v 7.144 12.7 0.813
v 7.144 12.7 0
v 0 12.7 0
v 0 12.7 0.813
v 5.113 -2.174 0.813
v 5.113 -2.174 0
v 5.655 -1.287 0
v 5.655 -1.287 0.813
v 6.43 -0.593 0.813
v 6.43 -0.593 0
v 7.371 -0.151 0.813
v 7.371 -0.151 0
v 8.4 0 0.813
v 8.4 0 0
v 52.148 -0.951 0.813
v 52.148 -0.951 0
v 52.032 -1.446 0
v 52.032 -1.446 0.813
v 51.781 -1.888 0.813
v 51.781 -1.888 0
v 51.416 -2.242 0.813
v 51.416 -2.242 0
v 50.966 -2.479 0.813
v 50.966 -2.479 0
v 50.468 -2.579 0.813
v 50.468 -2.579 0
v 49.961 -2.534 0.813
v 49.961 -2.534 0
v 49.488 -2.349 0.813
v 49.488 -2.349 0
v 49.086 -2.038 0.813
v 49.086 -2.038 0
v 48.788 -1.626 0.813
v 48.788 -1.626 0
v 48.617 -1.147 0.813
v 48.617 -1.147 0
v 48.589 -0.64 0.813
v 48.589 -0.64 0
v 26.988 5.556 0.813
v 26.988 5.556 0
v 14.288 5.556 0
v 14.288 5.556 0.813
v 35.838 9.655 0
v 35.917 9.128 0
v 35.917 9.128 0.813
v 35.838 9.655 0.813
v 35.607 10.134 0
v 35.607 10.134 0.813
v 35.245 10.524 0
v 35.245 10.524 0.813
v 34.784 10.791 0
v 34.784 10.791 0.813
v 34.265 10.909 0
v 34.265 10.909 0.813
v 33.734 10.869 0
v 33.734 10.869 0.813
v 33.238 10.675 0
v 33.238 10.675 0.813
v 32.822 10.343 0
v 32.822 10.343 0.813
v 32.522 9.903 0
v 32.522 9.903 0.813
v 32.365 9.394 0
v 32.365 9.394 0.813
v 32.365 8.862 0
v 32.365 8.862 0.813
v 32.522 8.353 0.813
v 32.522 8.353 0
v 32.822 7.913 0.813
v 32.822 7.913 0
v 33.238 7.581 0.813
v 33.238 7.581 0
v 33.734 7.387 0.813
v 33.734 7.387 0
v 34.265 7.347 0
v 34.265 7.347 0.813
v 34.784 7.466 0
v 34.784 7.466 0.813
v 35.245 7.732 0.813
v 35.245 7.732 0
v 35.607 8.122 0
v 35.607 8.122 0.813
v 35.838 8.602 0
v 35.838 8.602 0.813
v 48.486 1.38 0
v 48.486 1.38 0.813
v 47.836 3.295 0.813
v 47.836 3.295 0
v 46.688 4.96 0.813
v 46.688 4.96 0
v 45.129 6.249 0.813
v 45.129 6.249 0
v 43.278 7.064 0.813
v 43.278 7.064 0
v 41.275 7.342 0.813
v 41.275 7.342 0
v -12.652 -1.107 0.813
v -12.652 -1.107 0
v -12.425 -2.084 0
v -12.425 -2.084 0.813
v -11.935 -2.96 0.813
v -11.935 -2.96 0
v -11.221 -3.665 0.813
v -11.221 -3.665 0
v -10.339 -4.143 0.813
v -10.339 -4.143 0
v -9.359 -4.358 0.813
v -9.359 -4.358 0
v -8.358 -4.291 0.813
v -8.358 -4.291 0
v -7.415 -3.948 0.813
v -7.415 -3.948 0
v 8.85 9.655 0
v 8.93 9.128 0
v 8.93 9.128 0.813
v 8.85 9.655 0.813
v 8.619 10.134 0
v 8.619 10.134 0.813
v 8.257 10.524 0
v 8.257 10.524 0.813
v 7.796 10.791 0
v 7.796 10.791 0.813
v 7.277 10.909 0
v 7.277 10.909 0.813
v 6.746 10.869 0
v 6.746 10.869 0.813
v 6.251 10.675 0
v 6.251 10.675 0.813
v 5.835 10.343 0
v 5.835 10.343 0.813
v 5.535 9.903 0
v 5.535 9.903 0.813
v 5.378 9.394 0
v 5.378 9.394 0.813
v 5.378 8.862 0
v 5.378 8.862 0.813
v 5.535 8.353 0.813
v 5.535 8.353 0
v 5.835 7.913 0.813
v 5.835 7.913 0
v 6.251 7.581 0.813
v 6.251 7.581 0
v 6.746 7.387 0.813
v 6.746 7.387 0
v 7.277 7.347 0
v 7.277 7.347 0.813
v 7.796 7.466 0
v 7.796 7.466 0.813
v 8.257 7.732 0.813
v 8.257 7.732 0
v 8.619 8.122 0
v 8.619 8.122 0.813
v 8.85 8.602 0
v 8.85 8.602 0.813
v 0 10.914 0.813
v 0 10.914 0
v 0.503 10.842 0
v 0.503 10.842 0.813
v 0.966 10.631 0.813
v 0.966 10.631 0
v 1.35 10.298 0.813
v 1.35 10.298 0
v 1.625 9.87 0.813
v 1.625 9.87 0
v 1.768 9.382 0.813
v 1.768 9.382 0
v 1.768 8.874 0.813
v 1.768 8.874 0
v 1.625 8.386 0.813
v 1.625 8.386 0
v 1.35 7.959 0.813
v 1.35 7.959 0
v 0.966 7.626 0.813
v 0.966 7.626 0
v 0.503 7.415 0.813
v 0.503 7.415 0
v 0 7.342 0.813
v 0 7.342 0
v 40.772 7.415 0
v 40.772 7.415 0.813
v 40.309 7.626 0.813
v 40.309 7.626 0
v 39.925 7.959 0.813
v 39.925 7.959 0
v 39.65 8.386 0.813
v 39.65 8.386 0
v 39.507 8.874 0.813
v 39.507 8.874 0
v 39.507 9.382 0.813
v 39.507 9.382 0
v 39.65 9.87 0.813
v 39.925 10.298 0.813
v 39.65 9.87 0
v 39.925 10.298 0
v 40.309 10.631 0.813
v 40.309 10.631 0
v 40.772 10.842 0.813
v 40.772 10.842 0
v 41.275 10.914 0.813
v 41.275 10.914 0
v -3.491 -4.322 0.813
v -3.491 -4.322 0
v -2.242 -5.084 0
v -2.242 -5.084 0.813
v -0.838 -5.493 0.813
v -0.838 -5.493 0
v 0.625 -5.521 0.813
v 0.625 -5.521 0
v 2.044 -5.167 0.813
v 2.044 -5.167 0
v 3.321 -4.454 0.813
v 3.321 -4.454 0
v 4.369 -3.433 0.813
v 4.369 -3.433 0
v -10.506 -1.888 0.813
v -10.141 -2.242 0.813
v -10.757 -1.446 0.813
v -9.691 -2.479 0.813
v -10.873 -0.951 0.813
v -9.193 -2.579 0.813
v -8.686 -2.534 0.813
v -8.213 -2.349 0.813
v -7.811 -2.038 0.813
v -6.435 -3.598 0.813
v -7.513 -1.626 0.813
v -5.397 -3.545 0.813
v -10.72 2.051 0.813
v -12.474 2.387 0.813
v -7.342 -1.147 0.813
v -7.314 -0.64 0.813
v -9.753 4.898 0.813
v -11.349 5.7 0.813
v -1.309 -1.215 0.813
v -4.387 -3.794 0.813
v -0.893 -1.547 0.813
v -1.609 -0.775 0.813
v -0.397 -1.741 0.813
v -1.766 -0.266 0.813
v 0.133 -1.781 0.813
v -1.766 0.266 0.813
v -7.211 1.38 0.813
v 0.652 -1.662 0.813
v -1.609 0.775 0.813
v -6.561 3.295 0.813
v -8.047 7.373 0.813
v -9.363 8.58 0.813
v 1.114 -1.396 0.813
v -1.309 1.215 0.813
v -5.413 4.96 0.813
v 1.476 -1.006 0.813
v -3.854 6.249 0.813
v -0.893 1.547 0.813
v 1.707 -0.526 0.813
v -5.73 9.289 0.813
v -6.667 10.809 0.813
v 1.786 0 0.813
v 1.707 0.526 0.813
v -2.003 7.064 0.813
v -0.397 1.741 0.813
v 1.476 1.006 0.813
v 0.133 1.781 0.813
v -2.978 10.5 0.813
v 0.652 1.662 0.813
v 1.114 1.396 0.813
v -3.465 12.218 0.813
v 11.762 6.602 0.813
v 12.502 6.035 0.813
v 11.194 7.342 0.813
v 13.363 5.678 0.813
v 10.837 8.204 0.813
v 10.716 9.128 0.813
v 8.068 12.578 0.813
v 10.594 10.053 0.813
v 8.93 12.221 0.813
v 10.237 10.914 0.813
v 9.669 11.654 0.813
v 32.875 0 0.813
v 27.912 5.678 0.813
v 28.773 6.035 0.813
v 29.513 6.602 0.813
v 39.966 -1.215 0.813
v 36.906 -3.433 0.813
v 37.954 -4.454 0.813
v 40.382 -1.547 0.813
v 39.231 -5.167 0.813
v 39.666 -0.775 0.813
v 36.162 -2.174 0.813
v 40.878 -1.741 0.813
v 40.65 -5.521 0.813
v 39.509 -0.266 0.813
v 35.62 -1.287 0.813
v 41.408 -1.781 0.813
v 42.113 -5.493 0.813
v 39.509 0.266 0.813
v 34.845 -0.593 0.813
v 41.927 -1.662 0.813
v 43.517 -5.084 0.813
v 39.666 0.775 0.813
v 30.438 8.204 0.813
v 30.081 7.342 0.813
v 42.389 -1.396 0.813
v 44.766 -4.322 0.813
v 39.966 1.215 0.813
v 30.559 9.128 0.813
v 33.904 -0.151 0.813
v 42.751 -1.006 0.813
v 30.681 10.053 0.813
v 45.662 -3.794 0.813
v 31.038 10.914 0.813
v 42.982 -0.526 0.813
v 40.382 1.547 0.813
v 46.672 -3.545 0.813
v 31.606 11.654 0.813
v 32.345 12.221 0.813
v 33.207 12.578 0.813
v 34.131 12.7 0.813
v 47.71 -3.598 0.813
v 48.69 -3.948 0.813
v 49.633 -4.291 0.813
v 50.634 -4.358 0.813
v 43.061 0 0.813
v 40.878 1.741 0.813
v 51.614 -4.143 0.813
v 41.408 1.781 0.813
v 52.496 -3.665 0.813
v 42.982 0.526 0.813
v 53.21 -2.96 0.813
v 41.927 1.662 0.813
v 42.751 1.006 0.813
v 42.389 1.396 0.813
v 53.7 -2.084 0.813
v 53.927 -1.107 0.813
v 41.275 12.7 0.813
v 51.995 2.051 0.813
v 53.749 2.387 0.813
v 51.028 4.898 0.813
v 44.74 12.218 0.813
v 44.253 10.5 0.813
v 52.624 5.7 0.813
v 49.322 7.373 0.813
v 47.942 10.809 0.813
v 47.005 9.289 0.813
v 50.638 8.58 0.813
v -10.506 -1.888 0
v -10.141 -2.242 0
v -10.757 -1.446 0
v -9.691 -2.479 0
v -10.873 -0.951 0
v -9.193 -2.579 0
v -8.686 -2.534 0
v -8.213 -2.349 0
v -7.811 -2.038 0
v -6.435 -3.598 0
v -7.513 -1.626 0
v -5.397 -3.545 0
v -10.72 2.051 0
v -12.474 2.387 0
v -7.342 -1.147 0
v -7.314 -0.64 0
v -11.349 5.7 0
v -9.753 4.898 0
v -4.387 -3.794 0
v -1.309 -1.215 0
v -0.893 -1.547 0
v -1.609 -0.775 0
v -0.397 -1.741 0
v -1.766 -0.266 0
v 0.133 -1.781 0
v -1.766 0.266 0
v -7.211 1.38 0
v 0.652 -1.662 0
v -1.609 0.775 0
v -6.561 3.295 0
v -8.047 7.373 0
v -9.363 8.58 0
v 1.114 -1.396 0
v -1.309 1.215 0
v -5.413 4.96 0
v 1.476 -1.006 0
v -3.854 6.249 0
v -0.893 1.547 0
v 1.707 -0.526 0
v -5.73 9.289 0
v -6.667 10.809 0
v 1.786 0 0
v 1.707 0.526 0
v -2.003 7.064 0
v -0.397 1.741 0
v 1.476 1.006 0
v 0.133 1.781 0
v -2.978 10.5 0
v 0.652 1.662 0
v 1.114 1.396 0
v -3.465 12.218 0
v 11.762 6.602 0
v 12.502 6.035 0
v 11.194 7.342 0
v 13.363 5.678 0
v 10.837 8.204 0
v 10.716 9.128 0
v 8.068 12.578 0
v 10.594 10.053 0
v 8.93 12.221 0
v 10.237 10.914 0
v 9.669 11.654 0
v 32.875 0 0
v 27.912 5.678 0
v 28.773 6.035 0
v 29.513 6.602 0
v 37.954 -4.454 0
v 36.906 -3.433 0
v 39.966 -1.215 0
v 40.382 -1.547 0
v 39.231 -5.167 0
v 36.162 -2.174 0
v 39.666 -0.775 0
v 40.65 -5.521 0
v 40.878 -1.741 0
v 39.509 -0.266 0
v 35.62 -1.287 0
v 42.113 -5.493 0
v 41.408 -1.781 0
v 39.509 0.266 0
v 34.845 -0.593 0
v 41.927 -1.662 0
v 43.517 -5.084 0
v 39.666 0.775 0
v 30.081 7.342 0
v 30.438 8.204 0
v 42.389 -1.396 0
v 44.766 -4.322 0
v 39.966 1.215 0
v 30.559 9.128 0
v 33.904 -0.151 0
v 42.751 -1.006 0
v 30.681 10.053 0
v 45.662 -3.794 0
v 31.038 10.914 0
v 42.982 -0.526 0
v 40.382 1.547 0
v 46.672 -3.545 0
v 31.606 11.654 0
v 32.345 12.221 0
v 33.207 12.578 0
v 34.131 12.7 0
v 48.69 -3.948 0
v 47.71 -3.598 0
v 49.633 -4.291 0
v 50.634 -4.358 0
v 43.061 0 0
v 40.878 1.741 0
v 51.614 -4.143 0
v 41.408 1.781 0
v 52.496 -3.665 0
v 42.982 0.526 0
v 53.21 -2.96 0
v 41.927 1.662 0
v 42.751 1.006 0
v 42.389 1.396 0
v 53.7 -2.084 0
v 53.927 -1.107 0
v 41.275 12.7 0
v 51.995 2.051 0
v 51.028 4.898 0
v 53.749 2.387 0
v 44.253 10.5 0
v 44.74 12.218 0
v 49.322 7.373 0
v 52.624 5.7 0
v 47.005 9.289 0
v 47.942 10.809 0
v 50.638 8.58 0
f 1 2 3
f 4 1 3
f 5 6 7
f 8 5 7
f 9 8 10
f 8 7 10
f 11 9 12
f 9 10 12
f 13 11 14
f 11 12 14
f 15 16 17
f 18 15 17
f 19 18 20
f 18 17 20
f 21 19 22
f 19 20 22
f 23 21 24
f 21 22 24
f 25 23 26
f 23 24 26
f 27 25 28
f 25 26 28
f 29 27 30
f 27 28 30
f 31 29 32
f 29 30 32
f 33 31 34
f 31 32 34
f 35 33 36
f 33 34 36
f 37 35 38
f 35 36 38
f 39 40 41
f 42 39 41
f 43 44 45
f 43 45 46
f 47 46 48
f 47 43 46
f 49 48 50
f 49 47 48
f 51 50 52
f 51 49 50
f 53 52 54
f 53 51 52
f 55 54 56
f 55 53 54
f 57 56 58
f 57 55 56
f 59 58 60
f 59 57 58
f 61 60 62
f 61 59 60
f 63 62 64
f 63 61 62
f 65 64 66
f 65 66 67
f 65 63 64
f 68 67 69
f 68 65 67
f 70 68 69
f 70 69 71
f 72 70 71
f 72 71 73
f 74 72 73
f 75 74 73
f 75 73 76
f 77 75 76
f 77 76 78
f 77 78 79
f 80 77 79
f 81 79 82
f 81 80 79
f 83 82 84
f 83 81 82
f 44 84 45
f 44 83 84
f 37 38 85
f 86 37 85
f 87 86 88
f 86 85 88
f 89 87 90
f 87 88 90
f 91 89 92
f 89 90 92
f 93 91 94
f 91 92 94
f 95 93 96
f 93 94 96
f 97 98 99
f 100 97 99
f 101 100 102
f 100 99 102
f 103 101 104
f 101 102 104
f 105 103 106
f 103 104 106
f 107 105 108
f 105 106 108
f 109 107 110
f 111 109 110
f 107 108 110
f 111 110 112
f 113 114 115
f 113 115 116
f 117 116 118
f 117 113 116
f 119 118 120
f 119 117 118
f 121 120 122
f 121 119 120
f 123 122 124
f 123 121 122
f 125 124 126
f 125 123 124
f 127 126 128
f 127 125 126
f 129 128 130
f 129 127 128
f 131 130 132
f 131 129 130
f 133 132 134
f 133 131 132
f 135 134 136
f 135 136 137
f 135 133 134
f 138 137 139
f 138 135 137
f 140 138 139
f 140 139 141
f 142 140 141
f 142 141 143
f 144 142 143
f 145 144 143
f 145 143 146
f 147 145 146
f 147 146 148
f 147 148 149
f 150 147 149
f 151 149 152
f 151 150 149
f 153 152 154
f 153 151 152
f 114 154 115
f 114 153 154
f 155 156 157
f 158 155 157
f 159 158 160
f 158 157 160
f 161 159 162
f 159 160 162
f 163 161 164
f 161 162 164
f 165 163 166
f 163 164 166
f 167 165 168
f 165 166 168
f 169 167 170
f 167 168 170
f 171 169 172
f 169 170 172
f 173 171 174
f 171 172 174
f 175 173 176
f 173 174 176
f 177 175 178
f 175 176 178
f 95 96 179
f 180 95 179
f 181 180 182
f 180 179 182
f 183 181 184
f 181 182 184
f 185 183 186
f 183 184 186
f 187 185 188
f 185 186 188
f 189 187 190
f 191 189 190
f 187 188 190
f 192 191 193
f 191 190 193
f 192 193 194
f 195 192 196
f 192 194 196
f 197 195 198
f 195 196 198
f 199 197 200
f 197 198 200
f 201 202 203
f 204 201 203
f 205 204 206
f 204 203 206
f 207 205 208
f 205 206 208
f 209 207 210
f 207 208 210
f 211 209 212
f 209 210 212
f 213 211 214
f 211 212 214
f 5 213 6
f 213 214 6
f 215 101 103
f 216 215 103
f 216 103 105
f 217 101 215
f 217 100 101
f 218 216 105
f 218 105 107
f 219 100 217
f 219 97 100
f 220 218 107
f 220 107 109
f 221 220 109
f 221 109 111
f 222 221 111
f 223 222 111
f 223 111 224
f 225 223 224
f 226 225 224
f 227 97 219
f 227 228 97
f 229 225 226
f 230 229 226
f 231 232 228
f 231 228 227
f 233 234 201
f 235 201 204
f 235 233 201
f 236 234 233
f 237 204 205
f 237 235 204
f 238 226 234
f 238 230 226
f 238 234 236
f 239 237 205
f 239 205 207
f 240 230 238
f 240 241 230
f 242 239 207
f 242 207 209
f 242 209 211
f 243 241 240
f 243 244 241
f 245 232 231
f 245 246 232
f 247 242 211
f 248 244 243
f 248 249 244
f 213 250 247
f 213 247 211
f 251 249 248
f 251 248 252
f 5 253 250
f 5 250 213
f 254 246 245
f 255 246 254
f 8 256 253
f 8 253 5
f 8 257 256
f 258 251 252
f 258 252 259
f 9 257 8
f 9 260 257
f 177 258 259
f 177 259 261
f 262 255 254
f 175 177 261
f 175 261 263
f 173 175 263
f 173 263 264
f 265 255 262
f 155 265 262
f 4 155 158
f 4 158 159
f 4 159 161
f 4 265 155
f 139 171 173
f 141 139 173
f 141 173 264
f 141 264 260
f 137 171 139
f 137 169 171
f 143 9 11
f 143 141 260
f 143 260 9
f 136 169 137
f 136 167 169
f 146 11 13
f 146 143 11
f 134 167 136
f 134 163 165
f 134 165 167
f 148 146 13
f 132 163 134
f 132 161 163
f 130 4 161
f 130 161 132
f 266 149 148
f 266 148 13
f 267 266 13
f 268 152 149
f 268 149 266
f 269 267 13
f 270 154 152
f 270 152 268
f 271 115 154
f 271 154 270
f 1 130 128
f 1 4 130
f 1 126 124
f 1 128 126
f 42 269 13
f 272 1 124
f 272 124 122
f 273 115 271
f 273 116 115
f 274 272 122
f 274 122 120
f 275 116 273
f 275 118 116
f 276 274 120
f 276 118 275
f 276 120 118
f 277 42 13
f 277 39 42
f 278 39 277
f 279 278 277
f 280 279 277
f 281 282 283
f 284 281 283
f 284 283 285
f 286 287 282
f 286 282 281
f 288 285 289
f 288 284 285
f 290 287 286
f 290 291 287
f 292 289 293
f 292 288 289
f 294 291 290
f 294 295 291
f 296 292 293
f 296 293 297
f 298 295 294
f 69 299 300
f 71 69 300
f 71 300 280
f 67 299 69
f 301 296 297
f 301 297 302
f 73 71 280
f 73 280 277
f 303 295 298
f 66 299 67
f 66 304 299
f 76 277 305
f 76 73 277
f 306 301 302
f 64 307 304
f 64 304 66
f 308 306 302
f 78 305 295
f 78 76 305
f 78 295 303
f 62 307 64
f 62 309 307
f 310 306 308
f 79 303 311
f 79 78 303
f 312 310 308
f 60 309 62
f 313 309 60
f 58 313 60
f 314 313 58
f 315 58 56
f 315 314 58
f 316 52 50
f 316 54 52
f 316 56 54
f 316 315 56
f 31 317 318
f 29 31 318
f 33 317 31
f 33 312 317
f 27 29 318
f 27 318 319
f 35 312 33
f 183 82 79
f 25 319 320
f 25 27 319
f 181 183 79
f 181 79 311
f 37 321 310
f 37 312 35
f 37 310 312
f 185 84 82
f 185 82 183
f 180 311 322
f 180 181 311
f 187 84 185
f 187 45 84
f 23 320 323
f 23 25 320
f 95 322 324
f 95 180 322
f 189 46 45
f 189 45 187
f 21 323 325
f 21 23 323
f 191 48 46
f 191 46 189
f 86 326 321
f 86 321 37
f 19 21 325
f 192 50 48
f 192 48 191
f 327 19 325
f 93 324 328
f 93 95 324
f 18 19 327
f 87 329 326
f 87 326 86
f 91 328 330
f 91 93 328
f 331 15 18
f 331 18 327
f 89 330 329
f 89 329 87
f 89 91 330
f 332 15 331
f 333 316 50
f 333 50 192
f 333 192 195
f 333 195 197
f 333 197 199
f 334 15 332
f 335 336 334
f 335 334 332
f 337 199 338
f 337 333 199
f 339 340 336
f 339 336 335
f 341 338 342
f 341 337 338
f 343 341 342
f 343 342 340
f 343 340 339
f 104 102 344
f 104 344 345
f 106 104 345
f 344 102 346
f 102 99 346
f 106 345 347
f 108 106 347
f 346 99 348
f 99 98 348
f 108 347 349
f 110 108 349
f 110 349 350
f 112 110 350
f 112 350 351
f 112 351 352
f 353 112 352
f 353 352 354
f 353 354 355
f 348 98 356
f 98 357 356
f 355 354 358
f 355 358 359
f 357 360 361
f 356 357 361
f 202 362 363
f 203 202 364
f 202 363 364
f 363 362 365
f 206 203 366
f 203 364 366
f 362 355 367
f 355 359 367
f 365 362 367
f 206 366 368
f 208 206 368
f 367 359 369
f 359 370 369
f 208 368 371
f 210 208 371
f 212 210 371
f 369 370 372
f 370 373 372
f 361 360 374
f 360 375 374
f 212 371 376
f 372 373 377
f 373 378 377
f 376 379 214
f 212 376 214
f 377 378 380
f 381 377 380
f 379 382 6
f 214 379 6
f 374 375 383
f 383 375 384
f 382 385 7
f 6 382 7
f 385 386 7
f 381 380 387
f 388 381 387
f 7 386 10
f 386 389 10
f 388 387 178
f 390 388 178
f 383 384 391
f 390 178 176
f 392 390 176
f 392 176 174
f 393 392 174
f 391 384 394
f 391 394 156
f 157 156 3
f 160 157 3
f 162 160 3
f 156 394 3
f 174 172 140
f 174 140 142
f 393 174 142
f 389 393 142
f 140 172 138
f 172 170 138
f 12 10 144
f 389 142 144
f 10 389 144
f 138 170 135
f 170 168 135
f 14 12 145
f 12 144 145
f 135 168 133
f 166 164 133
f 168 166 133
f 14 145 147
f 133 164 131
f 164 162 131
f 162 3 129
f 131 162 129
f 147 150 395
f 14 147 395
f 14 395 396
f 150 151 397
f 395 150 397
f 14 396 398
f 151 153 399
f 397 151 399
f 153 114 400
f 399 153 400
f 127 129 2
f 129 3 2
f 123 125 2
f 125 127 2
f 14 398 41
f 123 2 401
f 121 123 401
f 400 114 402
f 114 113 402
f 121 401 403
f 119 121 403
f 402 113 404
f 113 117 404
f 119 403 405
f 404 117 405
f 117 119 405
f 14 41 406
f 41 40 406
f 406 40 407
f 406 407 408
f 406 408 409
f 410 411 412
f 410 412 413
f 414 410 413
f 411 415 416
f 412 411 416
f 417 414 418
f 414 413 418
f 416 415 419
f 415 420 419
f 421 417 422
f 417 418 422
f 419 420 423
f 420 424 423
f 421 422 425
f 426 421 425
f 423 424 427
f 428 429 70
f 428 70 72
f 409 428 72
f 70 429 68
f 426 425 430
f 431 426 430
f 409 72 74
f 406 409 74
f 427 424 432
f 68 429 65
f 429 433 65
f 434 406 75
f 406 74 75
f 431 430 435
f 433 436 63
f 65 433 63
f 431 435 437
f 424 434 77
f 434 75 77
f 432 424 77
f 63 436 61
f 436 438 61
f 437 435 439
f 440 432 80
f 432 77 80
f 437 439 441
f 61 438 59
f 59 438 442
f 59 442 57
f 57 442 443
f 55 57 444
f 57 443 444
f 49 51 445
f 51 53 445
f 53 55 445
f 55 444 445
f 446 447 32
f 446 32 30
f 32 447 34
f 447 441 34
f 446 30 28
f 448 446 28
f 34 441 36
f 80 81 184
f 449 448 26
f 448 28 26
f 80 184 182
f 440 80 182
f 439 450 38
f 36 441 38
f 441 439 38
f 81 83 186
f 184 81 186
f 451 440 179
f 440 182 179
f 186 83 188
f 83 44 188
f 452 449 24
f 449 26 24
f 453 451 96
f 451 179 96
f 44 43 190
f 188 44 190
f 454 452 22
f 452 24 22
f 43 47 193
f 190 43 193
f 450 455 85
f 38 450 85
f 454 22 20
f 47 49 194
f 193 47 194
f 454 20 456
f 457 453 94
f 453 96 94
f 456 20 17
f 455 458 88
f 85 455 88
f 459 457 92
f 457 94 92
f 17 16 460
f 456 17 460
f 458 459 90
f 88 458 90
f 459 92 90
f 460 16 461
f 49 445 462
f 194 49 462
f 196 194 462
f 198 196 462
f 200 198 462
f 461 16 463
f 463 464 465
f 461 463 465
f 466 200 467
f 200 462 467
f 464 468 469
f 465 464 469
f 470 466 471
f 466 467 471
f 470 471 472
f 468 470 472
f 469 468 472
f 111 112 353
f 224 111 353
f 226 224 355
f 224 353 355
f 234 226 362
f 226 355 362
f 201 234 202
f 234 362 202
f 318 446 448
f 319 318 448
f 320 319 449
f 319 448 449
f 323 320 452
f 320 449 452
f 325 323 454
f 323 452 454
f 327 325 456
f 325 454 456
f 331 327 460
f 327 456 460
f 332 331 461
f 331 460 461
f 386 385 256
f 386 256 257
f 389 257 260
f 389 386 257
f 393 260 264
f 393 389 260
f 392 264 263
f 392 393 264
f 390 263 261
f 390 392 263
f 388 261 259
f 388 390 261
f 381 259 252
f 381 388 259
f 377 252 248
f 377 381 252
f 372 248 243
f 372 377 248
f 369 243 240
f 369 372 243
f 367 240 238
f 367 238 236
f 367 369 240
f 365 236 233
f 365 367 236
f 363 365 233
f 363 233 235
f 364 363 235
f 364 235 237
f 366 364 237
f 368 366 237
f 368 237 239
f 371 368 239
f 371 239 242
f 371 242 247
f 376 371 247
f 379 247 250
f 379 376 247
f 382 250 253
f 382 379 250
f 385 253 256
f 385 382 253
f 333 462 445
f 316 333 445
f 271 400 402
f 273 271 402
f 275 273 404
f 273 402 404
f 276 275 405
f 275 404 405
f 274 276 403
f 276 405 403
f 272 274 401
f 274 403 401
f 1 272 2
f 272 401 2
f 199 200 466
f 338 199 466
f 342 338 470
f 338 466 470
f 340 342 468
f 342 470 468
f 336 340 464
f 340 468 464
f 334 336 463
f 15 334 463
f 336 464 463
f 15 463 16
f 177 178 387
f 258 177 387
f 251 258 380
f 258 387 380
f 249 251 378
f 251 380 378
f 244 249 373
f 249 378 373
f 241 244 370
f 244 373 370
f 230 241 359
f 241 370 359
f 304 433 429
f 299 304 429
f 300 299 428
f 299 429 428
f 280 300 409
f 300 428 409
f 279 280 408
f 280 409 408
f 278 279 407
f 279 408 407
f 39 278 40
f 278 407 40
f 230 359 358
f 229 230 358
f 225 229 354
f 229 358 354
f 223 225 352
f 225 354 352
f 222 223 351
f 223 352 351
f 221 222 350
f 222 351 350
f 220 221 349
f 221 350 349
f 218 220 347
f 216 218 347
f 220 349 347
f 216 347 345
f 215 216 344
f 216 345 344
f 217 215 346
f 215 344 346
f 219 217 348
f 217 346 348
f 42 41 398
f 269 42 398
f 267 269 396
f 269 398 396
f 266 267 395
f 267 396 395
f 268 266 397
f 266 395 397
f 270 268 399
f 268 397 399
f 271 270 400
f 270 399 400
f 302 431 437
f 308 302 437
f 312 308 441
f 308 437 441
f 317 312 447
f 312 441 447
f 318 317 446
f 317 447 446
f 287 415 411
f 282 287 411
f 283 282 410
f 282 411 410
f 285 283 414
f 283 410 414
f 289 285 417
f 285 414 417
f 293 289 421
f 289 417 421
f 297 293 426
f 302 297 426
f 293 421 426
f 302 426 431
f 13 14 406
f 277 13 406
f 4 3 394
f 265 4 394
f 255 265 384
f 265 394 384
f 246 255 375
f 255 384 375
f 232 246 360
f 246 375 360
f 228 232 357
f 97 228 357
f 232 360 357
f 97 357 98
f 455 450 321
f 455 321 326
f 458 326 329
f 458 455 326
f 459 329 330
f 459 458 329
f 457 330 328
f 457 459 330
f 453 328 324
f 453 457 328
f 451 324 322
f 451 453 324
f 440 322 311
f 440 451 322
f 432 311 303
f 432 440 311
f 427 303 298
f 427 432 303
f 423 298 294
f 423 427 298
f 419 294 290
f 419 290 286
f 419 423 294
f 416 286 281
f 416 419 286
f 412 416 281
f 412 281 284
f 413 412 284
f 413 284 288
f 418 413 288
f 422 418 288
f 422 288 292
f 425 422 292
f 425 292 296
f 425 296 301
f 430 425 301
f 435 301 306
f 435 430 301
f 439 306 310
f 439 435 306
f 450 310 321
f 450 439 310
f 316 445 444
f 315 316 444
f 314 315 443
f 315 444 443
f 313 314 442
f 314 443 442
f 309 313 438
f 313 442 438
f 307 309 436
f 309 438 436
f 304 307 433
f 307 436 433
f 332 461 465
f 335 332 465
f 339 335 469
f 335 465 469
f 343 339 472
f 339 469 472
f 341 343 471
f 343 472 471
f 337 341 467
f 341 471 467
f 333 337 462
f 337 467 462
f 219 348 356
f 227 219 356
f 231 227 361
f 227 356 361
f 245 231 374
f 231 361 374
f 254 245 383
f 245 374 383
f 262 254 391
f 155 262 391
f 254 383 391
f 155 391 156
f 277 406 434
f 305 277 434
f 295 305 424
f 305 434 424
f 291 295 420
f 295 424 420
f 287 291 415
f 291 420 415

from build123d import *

# Parameters (mm, degrees)
SKETCH1_R           = 1.7859375
BOSS_EXTRUDE1_DEPTH = 0.8128


with BuildPart() as part:
    # Sketch1 → Boss-Extrude1 (new body)
    with BuildSketch(Plane.XY):
        with BuildLine():
            ThreePointArc((5.113201945, -2.174184888), (6.429738065, -0.592725341), (8.400260413, 0))
            Line((8.400260413, 0), (32.874739587, 0))
            ThreePointArc((32.874739587, 0), (34.845261898, -0.592725316), (36.161798019, -2.174184805))
            ThreePointArc((36.161798019, -2.174184805), (39.929142732, -5.390786796), (44.766280182, -4.322369345))
            ThreePointArc((44.766280182, -4.322369345), (46.671647173, -3.545286328), (48.689532151, -3.948301971))
            ThreePointArc((48.689532151, -3.948301971), (52.071763604, -3.935123969), (53.926672666, -1.106877933))
            ThreePointArc((53.926672666, -1.106877933), (50.638422177, 8.579995637), (41.275, 12.7))
            Line((41.275, 12.7), (34.13125, 12.7))
            ThreePointArc((34.13125, 12.7), (31.605552966, 11.653822034), (30.559375, 9.128125))
            ThreePointArc((30.559375, 9.128125), (29.513197034, 6.602427966), (26.9875, 5.55625))
            Line((26.9875, 5.55625), (14.2875, 5.55625))
            ThreePointArc((14.2875, 5.55625), (11.761802966, 6.602427966), (10.715625, 9.128125))
            ThreePointArc((10.715625, 9.128125), (9.669447034, 11.653822034), (7.14375, 12.7))
            Line((7.14375, 12.7), (0, 12.7))
            ThreePointArc((0, 12.7), (-9.363422177, 8.579995637), (-12.651672666, -1.106877933))
            ThreePointArc((-12.651672666, -1.106877933), (-10.796763578, -3.935123983), (-7.414532098, -3.948301943))
            ThreePointArc((-7.414532098, -3.948301943), (-5.396647132, -3.545286332), (-3.491280162, -4.322369361))
            ThreePointArc((-3.491280162, -4.322369361), (1.345857236, -5.390786804), (5.113201945, -2.174184888))
        make_face()
        with BuildLine():
            ThreePointArc((52.147531197, -0.951223224), (50.212735019, -2.574709983), (48.58924826, -0.639913805))
            ThreePointArc((48.58924826, -0.639913805), (46.688228446, 4.960309977), (41.275, 7.3421875))
            ThreePointArc((41.275, 7.3421875), (39.4890625, 9.128125), (41.275, 10.9140625))
            ThreePointArc((41.275, 10.9140625), (49.321690934, 7.37343375), (52.147531197, -0.951223224))
        make_face(mode=Mode.SUBTRACT)
        with BuildLine():
            ThreePointArc((0, 10.9140625), (1.7859375, 9.128125), (0, 7.3421875))
            ThreePointArc((0, 7.3421875), (-5.413228446, 4.960309977), (-7.31424826, -0.639913805))
            ThreePointArc((-7.31424826, -0.639913805), (-8.937735019, -2.574709983), (-10.872531197, -0.951223224))
            ThreePointArc((-10.872531197, -0.951223224), (-8.046690934, 7.37343375), (0, 10.9140625))
        make_face(mode=Mode.SUBTRACT)
        Circle(SKETCH1_R, mode=Mode.SUBTRACT)
        with Locations((41.275, 0)):
            Circle(SKETCH1_R, mode=Mode.SUBTRACT)
        with Locations((7.14375, 9.128125)):
            Circle(SKETCH1_R, mode=Mode.SUBTRACT)
        with Locations((34.13125, 9.128125)):
            Circle(SKETCH1_R, mode=Mode.SUBTRACT)
    extrude(amount=BOSS_EXTRUDE1_DEPTH)


solid = part.part
